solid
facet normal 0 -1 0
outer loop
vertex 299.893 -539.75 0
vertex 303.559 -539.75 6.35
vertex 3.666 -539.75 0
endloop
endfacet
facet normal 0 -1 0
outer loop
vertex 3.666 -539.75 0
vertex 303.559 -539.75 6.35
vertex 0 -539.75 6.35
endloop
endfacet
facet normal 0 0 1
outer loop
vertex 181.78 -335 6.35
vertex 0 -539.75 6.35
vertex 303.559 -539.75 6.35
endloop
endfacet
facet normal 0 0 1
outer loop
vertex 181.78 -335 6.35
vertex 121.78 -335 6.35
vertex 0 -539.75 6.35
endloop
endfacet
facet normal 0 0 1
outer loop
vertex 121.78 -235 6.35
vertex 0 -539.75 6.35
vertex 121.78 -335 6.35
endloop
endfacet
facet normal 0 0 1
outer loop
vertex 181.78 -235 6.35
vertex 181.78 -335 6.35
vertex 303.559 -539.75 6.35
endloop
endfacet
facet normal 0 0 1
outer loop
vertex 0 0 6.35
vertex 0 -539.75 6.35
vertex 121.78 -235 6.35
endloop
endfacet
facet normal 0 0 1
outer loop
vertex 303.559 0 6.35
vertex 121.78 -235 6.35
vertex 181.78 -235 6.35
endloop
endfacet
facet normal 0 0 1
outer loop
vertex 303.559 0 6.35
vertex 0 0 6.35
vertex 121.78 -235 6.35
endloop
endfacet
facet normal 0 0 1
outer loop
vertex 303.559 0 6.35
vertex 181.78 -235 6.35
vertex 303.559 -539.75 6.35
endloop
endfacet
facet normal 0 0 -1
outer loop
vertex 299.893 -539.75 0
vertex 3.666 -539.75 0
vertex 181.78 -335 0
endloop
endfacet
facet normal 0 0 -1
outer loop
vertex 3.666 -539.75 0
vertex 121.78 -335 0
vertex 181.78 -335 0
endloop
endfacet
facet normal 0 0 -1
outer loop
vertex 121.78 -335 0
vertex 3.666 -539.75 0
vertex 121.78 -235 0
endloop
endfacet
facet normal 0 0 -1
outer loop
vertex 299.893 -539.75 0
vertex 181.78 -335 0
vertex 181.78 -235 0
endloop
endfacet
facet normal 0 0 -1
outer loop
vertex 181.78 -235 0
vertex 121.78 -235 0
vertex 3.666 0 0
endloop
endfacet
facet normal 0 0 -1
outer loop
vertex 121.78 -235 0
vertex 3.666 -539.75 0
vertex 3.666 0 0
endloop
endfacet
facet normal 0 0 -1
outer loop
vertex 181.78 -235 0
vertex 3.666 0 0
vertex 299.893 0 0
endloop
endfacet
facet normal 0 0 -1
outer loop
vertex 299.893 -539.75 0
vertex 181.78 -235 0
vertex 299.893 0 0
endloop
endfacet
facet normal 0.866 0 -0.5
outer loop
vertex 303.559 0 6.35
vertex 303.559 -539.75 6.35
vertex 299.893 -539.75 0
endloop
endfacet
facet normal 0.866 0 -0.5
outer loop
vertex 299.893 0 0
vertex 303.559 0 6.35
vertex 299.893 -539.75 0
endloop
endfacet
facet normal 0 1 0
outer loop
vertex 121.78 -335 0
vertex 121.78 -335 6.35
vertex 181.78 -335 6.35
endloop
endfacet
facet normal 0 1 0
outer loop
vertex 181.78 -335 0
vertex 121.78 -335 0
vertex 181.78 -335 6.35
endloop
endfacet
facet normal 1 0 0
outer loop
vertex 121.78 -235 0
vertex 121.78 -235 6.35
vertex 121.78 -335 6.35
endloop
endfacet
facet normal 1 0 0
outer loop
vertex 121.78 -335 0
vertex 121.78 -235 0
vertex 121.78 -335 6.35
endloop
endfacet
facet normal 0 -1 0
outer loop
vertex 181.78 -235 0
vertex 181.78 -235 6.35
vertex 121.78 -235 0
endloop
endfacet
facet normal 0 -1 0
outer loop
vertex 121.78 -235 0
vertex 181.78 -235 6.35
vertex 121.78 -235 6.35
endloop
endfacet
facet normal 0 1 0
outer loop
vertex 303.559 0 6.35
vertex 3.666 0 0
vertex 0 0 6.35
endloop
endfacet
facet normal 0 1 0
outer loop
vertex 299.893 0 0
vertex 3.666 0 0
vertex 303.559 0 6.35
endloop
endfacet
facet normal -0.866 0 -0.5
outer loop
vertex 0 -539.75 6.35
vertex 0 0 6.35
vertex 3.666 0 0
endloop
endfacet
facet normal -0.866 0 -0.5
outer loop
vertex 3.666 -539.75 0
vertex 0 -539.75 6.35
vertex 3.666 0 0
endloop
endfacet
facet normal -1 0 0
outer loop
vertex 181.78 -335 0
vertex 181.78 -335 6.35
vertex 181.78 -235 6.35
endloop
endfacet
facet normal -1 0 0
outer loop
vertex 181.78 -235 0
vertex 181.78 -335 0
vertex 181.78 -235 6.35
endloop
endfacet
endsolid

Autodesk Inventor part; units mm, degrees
ref_plane "YZ Plane" through (0, 0, 0) normal (1, 0, 0) x (0, 1, 0)
ref_plane "XZ Plane" through (0, 0, 0) normal (0, 1, 0) x (-1, 0, 0)
ref_plane "XY Plane" through (0, 0, 0) normal (0, 0, 1) x (1, 0, 0)
sketch "Sketch1" plane through (0, 0, 0) normal (0, 0, 1) x (1, 0, 0)
  line L0 (0, 0) -> (303.5592, 0)
  line L1 (303.5592, 0) -> (303.5592, -533.4)
  line L2 (303.5592, -533.4) -> (0, -533.4)
  line L3 (0, -533.4) -> (0, 0)
  line L4 (455.3388, 262.89) -> (303.5592, 0)
  line L5 (303.5592, 0) -> (0, 0)
  line L6 (0, 0) -> (-151.7796, 262.89)
  line L7 (-151.7796, 262.89) -> (0, 525.78)
  line L8 (0, 525.78) -> (303.5592, 525.78)
  line L9 (303.5592, 525.78) -> (455.3388, 262.89)
  point P0 (151.7796, 262.89)
  dimension "d1" = 533.4
  dimension "d54" = 525.78
extrude "Extrusion1" add sketch "Sketch1" along normal blind 6.35 contours L0 L1 L2 L3
sketch "Sketch2" plane through (0, 0, 0) normal (0, 1, 0) x (1, 0, 0)
  line L0 (303.5592, -6.35) -> (0, -6.35) projected
  line L1 (0, -6.35) -> (-3.6662, -6.35)
  line L2 (-3.6662, -6.35) -> (0, 0)
  line L3 (0, 0) -> (0, -6.35) projected
  line L4 (0, 0) -> (0, -6.35) projected
  line L5 (0, -6.35) -> (0, 0)
  line L6 (303.5592, -6.35) -> (307.2254, -6.35)
  line L7 (303.5592, 0) -> (303.5592, -6.35) projected
  line L8 (307.2254, -6.35) -> (303.5592, 0)
  line L9 (303.5592, 0) -> (303.5592, -6.35)
  dimension "d4" = 30
  dimension "d5" = 60
extrude "Extrusion2" add sketch "Sketch2" against normal blind 533.4
sketch "Sketch4" plane through (0, 0, 6.35) normal (0, 0, 1) x (1, 0, 0)
  line L0 (137.7796, -228.6) -> (165.7796, -228.6)
  line L1 (165.7796, -228.6) -> (165.7796, -278.6)
  line L2 (165.7796, -278.6) -> (137.7796, -278.6)
  line L3 (137.7796, -278.6) -> (137.7796, -228.6)
  line L4 (-3.6662, 0) -> (-3.6662, -533.4) projected
  line L5 (-3.6662, 0) -> (307.2254, 0) projected
  line L6 (307.2254, -533.4) -> (-3.6662, -533.4) projected
  circle A0 centre (131.7796, -253.6) radius 3
  circle A1 centre (171.7796, -253.6) radius 3
  point P0 (0, 0)
  point P1 (151.7796, -228.6)
  point P2 (151.7796, 0)
  point P3 (165.7796, -253.6)
  point P4 (137.7796, -253.6)
  dimension "d16" = 28
  dimension "d17" = 50
  dimension "d19" = 6
  dimension "d20" = 6
  dimension "d21" = 6
  dimension "d22" = 6
  dimension "d41" = 228.6
extrude "Extrusion4" cut sketch "Sketch4" against normal through all
sketch "Sketch5" plane through (0, 0, 6.35) normal (0, 0, 1) x (1, 0, 0)
  line L0 (195.2796, -309.6) -> (108.2796, -309.6)
  line L1 (108.2796, -309.6) -> (108.2796, -298.6)
  line L2 (108.2796, -298.6) -> (195.2796, -298.6)
  line L3 (195.2796, -298.6) -> (195.2796, -309.6)
  line L4 (165.7796, -278.6) -> (137.7796, -278.6) projected
  line L5 (181.2796, -330.6) -> (159.2796, -330.6)
  line L6 (159.2796, -330.6) -> (159.2796, -318.6)
  line L7 (159.2796, -318.6) -> (181.2796, -318.6)
  line L8 (181.2796, -318.6) -> (181.2796, -330.6)
  line L9 (144.2796, -334.6) -> (122.2796, -334.6)
  line L10 (122.2796, -334.6) -> (122.2796, -314.6)
  line L11 (122.2796, -314.6) -> (144.2796, -314.6)
  line L12 (144.2796, -314.6) -> (144.2796, -334.6)
  line L13 (159.2796, -324.6) -> (144.2796, -324.6) construction
  point P0 (0, 0)
  point P1 (151.7796, -298.6)
  point P2 (151.7796, -278.6)
  point P3 (151.7796, -324.6)
  dimension "d26" = 87
  dimension "d27" = 11
  dimension "d28" = 20
  dimension "d29" = 22
  dimension "d30" = 12
  dimension "d32" = 22
  dimension "d33" = 20
  dimension "d37" = 15
  dimension "d38" = 15
extrude "Extrusion5" cut sketch "Sketch5" against normal through all
sketch "Sketch7" plane through (0, 0, 6.35) normal (0, 0, 1) x (1, 0, 0)
  line L0 (101.7796, -345) -> (201.7796, -345)
  line L1 (201.7796, -345) -> (201.7796, -225)
  line L2 (201.7796, -225) -> (101.7796, -225)
  line L3 (101.7796, -225) -> (101.7796, -345)
  line L4 (-3.6662, 0) -> (307.2254, 0) projected
  point P0 (0, 0)
  point P1 (151.7796, -225)
  point P2 (151.7796, 0)
  dimension "d49" = 100
  dimension "d50" = 120
  dimension "d51" = 225
extrude "Extrusion7" cut sketch "Sketch7" against normal through all
sketch "Sketch8" plane through (0, 0, 0) normal (0, 1, 0) x (1, 0, 0)
  line L0 (-3.6662, -6.35) -> (307.2254, -6.35) projected
  line L1 (0, 0) -> (-3.6662, 0)
  line L2 (-3.6662, 0) -> (-3.6662, -6.35)
  line L3 (-3.6662, -6.35) -> (0, -6.35)
  line L4 (0, -6.35) -> (0, 0)
  line L5 (0, 0) -> (303.5592, 0) projected
  line L6 (307.2254, -6.35) -> (303.5592, -6.35)
  line L7 (303.5592, -6.35) -> (303.5592, 0)
  line L8 (303.5592, 0) -> (307.2254, 0)
  line L9 (307.2254, 0) -> (307.2254, -6.35)
extrude "Extrusion8" cut sketch "Sketch8" against normal through all contours L2 L1 L4 L0 | L7 L8 L9 L0
sketch "Sketch9" plane through (0, 0, 6.35) normal (0, 0, 1) x (1, 0, 0)
  line L0 (121.7796, -335) -> (181.7796, -335)
  line L1 (181.7796, -335) -> (181.7796, -235)
  line L2 (181.7796, -235) -> (121.7796, -235)
  line L3 (121.7796, -235) -> (121.7796, -335)
  line L4 (0, 0) -> (303.5592, 0) projected
  line L5 (101.7796, -345) -> (101.7796, -225) projected
  line L6 (201.7796, -225) -> (201.7796, -345) projected
  line L7 (201.7796, -345) -> (101.7796, -345) projected
  line L8 (101.7796, -345) -> (101.7796, -225) projected
  line L9 (101.7796, -225) -> (201.7796, -225) projected
  line L10 (0, 0) -> (0, -533.4) projected
  line L11 (303.5592, -533.4) -> (0, -533.4) projected
  line L12 (303.5592, -533.4) -> (303.5592, 0) projected
  line L13 (0, 0) -> (303.5592, 0) projected
  point P0 (121.7796, -285)
  point P1 (101.7796, -285)
  point P2 (151.7796, -235)
  point P3 (151.7796, 0)
  dimension "d57" = 60
  dimension "d58" = 100
extrude "Extrusion9" add sketch "Sketch9" against normal blind 6.35 contours L5 L9 L6 L7
sketch "Sketch10" plane through (0, 0, 6.35) normal (0, 0, 1) x (1, 0, 0)
  line L0 (0, -533.4) -> (0, 0) projected
  line L1 (0, -533.4) -> (303.5592, -533.4)
  line L2 (303.5592, -533.4) -> (303.5592, -539.75)
  line L3 (303.5592, -539.75) -> (0, -539.75)
  line L4 (0, -539.75) -> (0, -533.4)
  dimension "d61" = 6.35
extrude "Extrusion10" add sketch "Sketch10" against normal blind 6.35
sketch "Sketch11" plane through (0, 0, 0) normal (0, 1, 0) x (1, 0, 0)
  line L0 (0, -6.35) -> (303.5592, -6.35) construction
  line L1 (0, -6.35) -> (3.6662, 0)
  line L2 (0, 0) -> (303.5592, 0) construction
  line L3 (3.6662, 0) -> (0, 0)
  line L4 (0, 0) -> (0, -6.35)
  line L5 (303.5592, -6.35) -> (299.8931, 0)
  line L6 (299.8931, 0) -> (303.5592, 0)
  line L7 (303.5592, -6.35) -> (303.5592, 0) projected
  line L8 (303.5592, -6.35) -> (303.5592, 0)
  dimension "d64" = 30
  dimension "d65" = 30
extrude "Extrusion11" cut sketch "Sketch11" against normal through all
properties part number "BA03" material "ABS Plastic"
